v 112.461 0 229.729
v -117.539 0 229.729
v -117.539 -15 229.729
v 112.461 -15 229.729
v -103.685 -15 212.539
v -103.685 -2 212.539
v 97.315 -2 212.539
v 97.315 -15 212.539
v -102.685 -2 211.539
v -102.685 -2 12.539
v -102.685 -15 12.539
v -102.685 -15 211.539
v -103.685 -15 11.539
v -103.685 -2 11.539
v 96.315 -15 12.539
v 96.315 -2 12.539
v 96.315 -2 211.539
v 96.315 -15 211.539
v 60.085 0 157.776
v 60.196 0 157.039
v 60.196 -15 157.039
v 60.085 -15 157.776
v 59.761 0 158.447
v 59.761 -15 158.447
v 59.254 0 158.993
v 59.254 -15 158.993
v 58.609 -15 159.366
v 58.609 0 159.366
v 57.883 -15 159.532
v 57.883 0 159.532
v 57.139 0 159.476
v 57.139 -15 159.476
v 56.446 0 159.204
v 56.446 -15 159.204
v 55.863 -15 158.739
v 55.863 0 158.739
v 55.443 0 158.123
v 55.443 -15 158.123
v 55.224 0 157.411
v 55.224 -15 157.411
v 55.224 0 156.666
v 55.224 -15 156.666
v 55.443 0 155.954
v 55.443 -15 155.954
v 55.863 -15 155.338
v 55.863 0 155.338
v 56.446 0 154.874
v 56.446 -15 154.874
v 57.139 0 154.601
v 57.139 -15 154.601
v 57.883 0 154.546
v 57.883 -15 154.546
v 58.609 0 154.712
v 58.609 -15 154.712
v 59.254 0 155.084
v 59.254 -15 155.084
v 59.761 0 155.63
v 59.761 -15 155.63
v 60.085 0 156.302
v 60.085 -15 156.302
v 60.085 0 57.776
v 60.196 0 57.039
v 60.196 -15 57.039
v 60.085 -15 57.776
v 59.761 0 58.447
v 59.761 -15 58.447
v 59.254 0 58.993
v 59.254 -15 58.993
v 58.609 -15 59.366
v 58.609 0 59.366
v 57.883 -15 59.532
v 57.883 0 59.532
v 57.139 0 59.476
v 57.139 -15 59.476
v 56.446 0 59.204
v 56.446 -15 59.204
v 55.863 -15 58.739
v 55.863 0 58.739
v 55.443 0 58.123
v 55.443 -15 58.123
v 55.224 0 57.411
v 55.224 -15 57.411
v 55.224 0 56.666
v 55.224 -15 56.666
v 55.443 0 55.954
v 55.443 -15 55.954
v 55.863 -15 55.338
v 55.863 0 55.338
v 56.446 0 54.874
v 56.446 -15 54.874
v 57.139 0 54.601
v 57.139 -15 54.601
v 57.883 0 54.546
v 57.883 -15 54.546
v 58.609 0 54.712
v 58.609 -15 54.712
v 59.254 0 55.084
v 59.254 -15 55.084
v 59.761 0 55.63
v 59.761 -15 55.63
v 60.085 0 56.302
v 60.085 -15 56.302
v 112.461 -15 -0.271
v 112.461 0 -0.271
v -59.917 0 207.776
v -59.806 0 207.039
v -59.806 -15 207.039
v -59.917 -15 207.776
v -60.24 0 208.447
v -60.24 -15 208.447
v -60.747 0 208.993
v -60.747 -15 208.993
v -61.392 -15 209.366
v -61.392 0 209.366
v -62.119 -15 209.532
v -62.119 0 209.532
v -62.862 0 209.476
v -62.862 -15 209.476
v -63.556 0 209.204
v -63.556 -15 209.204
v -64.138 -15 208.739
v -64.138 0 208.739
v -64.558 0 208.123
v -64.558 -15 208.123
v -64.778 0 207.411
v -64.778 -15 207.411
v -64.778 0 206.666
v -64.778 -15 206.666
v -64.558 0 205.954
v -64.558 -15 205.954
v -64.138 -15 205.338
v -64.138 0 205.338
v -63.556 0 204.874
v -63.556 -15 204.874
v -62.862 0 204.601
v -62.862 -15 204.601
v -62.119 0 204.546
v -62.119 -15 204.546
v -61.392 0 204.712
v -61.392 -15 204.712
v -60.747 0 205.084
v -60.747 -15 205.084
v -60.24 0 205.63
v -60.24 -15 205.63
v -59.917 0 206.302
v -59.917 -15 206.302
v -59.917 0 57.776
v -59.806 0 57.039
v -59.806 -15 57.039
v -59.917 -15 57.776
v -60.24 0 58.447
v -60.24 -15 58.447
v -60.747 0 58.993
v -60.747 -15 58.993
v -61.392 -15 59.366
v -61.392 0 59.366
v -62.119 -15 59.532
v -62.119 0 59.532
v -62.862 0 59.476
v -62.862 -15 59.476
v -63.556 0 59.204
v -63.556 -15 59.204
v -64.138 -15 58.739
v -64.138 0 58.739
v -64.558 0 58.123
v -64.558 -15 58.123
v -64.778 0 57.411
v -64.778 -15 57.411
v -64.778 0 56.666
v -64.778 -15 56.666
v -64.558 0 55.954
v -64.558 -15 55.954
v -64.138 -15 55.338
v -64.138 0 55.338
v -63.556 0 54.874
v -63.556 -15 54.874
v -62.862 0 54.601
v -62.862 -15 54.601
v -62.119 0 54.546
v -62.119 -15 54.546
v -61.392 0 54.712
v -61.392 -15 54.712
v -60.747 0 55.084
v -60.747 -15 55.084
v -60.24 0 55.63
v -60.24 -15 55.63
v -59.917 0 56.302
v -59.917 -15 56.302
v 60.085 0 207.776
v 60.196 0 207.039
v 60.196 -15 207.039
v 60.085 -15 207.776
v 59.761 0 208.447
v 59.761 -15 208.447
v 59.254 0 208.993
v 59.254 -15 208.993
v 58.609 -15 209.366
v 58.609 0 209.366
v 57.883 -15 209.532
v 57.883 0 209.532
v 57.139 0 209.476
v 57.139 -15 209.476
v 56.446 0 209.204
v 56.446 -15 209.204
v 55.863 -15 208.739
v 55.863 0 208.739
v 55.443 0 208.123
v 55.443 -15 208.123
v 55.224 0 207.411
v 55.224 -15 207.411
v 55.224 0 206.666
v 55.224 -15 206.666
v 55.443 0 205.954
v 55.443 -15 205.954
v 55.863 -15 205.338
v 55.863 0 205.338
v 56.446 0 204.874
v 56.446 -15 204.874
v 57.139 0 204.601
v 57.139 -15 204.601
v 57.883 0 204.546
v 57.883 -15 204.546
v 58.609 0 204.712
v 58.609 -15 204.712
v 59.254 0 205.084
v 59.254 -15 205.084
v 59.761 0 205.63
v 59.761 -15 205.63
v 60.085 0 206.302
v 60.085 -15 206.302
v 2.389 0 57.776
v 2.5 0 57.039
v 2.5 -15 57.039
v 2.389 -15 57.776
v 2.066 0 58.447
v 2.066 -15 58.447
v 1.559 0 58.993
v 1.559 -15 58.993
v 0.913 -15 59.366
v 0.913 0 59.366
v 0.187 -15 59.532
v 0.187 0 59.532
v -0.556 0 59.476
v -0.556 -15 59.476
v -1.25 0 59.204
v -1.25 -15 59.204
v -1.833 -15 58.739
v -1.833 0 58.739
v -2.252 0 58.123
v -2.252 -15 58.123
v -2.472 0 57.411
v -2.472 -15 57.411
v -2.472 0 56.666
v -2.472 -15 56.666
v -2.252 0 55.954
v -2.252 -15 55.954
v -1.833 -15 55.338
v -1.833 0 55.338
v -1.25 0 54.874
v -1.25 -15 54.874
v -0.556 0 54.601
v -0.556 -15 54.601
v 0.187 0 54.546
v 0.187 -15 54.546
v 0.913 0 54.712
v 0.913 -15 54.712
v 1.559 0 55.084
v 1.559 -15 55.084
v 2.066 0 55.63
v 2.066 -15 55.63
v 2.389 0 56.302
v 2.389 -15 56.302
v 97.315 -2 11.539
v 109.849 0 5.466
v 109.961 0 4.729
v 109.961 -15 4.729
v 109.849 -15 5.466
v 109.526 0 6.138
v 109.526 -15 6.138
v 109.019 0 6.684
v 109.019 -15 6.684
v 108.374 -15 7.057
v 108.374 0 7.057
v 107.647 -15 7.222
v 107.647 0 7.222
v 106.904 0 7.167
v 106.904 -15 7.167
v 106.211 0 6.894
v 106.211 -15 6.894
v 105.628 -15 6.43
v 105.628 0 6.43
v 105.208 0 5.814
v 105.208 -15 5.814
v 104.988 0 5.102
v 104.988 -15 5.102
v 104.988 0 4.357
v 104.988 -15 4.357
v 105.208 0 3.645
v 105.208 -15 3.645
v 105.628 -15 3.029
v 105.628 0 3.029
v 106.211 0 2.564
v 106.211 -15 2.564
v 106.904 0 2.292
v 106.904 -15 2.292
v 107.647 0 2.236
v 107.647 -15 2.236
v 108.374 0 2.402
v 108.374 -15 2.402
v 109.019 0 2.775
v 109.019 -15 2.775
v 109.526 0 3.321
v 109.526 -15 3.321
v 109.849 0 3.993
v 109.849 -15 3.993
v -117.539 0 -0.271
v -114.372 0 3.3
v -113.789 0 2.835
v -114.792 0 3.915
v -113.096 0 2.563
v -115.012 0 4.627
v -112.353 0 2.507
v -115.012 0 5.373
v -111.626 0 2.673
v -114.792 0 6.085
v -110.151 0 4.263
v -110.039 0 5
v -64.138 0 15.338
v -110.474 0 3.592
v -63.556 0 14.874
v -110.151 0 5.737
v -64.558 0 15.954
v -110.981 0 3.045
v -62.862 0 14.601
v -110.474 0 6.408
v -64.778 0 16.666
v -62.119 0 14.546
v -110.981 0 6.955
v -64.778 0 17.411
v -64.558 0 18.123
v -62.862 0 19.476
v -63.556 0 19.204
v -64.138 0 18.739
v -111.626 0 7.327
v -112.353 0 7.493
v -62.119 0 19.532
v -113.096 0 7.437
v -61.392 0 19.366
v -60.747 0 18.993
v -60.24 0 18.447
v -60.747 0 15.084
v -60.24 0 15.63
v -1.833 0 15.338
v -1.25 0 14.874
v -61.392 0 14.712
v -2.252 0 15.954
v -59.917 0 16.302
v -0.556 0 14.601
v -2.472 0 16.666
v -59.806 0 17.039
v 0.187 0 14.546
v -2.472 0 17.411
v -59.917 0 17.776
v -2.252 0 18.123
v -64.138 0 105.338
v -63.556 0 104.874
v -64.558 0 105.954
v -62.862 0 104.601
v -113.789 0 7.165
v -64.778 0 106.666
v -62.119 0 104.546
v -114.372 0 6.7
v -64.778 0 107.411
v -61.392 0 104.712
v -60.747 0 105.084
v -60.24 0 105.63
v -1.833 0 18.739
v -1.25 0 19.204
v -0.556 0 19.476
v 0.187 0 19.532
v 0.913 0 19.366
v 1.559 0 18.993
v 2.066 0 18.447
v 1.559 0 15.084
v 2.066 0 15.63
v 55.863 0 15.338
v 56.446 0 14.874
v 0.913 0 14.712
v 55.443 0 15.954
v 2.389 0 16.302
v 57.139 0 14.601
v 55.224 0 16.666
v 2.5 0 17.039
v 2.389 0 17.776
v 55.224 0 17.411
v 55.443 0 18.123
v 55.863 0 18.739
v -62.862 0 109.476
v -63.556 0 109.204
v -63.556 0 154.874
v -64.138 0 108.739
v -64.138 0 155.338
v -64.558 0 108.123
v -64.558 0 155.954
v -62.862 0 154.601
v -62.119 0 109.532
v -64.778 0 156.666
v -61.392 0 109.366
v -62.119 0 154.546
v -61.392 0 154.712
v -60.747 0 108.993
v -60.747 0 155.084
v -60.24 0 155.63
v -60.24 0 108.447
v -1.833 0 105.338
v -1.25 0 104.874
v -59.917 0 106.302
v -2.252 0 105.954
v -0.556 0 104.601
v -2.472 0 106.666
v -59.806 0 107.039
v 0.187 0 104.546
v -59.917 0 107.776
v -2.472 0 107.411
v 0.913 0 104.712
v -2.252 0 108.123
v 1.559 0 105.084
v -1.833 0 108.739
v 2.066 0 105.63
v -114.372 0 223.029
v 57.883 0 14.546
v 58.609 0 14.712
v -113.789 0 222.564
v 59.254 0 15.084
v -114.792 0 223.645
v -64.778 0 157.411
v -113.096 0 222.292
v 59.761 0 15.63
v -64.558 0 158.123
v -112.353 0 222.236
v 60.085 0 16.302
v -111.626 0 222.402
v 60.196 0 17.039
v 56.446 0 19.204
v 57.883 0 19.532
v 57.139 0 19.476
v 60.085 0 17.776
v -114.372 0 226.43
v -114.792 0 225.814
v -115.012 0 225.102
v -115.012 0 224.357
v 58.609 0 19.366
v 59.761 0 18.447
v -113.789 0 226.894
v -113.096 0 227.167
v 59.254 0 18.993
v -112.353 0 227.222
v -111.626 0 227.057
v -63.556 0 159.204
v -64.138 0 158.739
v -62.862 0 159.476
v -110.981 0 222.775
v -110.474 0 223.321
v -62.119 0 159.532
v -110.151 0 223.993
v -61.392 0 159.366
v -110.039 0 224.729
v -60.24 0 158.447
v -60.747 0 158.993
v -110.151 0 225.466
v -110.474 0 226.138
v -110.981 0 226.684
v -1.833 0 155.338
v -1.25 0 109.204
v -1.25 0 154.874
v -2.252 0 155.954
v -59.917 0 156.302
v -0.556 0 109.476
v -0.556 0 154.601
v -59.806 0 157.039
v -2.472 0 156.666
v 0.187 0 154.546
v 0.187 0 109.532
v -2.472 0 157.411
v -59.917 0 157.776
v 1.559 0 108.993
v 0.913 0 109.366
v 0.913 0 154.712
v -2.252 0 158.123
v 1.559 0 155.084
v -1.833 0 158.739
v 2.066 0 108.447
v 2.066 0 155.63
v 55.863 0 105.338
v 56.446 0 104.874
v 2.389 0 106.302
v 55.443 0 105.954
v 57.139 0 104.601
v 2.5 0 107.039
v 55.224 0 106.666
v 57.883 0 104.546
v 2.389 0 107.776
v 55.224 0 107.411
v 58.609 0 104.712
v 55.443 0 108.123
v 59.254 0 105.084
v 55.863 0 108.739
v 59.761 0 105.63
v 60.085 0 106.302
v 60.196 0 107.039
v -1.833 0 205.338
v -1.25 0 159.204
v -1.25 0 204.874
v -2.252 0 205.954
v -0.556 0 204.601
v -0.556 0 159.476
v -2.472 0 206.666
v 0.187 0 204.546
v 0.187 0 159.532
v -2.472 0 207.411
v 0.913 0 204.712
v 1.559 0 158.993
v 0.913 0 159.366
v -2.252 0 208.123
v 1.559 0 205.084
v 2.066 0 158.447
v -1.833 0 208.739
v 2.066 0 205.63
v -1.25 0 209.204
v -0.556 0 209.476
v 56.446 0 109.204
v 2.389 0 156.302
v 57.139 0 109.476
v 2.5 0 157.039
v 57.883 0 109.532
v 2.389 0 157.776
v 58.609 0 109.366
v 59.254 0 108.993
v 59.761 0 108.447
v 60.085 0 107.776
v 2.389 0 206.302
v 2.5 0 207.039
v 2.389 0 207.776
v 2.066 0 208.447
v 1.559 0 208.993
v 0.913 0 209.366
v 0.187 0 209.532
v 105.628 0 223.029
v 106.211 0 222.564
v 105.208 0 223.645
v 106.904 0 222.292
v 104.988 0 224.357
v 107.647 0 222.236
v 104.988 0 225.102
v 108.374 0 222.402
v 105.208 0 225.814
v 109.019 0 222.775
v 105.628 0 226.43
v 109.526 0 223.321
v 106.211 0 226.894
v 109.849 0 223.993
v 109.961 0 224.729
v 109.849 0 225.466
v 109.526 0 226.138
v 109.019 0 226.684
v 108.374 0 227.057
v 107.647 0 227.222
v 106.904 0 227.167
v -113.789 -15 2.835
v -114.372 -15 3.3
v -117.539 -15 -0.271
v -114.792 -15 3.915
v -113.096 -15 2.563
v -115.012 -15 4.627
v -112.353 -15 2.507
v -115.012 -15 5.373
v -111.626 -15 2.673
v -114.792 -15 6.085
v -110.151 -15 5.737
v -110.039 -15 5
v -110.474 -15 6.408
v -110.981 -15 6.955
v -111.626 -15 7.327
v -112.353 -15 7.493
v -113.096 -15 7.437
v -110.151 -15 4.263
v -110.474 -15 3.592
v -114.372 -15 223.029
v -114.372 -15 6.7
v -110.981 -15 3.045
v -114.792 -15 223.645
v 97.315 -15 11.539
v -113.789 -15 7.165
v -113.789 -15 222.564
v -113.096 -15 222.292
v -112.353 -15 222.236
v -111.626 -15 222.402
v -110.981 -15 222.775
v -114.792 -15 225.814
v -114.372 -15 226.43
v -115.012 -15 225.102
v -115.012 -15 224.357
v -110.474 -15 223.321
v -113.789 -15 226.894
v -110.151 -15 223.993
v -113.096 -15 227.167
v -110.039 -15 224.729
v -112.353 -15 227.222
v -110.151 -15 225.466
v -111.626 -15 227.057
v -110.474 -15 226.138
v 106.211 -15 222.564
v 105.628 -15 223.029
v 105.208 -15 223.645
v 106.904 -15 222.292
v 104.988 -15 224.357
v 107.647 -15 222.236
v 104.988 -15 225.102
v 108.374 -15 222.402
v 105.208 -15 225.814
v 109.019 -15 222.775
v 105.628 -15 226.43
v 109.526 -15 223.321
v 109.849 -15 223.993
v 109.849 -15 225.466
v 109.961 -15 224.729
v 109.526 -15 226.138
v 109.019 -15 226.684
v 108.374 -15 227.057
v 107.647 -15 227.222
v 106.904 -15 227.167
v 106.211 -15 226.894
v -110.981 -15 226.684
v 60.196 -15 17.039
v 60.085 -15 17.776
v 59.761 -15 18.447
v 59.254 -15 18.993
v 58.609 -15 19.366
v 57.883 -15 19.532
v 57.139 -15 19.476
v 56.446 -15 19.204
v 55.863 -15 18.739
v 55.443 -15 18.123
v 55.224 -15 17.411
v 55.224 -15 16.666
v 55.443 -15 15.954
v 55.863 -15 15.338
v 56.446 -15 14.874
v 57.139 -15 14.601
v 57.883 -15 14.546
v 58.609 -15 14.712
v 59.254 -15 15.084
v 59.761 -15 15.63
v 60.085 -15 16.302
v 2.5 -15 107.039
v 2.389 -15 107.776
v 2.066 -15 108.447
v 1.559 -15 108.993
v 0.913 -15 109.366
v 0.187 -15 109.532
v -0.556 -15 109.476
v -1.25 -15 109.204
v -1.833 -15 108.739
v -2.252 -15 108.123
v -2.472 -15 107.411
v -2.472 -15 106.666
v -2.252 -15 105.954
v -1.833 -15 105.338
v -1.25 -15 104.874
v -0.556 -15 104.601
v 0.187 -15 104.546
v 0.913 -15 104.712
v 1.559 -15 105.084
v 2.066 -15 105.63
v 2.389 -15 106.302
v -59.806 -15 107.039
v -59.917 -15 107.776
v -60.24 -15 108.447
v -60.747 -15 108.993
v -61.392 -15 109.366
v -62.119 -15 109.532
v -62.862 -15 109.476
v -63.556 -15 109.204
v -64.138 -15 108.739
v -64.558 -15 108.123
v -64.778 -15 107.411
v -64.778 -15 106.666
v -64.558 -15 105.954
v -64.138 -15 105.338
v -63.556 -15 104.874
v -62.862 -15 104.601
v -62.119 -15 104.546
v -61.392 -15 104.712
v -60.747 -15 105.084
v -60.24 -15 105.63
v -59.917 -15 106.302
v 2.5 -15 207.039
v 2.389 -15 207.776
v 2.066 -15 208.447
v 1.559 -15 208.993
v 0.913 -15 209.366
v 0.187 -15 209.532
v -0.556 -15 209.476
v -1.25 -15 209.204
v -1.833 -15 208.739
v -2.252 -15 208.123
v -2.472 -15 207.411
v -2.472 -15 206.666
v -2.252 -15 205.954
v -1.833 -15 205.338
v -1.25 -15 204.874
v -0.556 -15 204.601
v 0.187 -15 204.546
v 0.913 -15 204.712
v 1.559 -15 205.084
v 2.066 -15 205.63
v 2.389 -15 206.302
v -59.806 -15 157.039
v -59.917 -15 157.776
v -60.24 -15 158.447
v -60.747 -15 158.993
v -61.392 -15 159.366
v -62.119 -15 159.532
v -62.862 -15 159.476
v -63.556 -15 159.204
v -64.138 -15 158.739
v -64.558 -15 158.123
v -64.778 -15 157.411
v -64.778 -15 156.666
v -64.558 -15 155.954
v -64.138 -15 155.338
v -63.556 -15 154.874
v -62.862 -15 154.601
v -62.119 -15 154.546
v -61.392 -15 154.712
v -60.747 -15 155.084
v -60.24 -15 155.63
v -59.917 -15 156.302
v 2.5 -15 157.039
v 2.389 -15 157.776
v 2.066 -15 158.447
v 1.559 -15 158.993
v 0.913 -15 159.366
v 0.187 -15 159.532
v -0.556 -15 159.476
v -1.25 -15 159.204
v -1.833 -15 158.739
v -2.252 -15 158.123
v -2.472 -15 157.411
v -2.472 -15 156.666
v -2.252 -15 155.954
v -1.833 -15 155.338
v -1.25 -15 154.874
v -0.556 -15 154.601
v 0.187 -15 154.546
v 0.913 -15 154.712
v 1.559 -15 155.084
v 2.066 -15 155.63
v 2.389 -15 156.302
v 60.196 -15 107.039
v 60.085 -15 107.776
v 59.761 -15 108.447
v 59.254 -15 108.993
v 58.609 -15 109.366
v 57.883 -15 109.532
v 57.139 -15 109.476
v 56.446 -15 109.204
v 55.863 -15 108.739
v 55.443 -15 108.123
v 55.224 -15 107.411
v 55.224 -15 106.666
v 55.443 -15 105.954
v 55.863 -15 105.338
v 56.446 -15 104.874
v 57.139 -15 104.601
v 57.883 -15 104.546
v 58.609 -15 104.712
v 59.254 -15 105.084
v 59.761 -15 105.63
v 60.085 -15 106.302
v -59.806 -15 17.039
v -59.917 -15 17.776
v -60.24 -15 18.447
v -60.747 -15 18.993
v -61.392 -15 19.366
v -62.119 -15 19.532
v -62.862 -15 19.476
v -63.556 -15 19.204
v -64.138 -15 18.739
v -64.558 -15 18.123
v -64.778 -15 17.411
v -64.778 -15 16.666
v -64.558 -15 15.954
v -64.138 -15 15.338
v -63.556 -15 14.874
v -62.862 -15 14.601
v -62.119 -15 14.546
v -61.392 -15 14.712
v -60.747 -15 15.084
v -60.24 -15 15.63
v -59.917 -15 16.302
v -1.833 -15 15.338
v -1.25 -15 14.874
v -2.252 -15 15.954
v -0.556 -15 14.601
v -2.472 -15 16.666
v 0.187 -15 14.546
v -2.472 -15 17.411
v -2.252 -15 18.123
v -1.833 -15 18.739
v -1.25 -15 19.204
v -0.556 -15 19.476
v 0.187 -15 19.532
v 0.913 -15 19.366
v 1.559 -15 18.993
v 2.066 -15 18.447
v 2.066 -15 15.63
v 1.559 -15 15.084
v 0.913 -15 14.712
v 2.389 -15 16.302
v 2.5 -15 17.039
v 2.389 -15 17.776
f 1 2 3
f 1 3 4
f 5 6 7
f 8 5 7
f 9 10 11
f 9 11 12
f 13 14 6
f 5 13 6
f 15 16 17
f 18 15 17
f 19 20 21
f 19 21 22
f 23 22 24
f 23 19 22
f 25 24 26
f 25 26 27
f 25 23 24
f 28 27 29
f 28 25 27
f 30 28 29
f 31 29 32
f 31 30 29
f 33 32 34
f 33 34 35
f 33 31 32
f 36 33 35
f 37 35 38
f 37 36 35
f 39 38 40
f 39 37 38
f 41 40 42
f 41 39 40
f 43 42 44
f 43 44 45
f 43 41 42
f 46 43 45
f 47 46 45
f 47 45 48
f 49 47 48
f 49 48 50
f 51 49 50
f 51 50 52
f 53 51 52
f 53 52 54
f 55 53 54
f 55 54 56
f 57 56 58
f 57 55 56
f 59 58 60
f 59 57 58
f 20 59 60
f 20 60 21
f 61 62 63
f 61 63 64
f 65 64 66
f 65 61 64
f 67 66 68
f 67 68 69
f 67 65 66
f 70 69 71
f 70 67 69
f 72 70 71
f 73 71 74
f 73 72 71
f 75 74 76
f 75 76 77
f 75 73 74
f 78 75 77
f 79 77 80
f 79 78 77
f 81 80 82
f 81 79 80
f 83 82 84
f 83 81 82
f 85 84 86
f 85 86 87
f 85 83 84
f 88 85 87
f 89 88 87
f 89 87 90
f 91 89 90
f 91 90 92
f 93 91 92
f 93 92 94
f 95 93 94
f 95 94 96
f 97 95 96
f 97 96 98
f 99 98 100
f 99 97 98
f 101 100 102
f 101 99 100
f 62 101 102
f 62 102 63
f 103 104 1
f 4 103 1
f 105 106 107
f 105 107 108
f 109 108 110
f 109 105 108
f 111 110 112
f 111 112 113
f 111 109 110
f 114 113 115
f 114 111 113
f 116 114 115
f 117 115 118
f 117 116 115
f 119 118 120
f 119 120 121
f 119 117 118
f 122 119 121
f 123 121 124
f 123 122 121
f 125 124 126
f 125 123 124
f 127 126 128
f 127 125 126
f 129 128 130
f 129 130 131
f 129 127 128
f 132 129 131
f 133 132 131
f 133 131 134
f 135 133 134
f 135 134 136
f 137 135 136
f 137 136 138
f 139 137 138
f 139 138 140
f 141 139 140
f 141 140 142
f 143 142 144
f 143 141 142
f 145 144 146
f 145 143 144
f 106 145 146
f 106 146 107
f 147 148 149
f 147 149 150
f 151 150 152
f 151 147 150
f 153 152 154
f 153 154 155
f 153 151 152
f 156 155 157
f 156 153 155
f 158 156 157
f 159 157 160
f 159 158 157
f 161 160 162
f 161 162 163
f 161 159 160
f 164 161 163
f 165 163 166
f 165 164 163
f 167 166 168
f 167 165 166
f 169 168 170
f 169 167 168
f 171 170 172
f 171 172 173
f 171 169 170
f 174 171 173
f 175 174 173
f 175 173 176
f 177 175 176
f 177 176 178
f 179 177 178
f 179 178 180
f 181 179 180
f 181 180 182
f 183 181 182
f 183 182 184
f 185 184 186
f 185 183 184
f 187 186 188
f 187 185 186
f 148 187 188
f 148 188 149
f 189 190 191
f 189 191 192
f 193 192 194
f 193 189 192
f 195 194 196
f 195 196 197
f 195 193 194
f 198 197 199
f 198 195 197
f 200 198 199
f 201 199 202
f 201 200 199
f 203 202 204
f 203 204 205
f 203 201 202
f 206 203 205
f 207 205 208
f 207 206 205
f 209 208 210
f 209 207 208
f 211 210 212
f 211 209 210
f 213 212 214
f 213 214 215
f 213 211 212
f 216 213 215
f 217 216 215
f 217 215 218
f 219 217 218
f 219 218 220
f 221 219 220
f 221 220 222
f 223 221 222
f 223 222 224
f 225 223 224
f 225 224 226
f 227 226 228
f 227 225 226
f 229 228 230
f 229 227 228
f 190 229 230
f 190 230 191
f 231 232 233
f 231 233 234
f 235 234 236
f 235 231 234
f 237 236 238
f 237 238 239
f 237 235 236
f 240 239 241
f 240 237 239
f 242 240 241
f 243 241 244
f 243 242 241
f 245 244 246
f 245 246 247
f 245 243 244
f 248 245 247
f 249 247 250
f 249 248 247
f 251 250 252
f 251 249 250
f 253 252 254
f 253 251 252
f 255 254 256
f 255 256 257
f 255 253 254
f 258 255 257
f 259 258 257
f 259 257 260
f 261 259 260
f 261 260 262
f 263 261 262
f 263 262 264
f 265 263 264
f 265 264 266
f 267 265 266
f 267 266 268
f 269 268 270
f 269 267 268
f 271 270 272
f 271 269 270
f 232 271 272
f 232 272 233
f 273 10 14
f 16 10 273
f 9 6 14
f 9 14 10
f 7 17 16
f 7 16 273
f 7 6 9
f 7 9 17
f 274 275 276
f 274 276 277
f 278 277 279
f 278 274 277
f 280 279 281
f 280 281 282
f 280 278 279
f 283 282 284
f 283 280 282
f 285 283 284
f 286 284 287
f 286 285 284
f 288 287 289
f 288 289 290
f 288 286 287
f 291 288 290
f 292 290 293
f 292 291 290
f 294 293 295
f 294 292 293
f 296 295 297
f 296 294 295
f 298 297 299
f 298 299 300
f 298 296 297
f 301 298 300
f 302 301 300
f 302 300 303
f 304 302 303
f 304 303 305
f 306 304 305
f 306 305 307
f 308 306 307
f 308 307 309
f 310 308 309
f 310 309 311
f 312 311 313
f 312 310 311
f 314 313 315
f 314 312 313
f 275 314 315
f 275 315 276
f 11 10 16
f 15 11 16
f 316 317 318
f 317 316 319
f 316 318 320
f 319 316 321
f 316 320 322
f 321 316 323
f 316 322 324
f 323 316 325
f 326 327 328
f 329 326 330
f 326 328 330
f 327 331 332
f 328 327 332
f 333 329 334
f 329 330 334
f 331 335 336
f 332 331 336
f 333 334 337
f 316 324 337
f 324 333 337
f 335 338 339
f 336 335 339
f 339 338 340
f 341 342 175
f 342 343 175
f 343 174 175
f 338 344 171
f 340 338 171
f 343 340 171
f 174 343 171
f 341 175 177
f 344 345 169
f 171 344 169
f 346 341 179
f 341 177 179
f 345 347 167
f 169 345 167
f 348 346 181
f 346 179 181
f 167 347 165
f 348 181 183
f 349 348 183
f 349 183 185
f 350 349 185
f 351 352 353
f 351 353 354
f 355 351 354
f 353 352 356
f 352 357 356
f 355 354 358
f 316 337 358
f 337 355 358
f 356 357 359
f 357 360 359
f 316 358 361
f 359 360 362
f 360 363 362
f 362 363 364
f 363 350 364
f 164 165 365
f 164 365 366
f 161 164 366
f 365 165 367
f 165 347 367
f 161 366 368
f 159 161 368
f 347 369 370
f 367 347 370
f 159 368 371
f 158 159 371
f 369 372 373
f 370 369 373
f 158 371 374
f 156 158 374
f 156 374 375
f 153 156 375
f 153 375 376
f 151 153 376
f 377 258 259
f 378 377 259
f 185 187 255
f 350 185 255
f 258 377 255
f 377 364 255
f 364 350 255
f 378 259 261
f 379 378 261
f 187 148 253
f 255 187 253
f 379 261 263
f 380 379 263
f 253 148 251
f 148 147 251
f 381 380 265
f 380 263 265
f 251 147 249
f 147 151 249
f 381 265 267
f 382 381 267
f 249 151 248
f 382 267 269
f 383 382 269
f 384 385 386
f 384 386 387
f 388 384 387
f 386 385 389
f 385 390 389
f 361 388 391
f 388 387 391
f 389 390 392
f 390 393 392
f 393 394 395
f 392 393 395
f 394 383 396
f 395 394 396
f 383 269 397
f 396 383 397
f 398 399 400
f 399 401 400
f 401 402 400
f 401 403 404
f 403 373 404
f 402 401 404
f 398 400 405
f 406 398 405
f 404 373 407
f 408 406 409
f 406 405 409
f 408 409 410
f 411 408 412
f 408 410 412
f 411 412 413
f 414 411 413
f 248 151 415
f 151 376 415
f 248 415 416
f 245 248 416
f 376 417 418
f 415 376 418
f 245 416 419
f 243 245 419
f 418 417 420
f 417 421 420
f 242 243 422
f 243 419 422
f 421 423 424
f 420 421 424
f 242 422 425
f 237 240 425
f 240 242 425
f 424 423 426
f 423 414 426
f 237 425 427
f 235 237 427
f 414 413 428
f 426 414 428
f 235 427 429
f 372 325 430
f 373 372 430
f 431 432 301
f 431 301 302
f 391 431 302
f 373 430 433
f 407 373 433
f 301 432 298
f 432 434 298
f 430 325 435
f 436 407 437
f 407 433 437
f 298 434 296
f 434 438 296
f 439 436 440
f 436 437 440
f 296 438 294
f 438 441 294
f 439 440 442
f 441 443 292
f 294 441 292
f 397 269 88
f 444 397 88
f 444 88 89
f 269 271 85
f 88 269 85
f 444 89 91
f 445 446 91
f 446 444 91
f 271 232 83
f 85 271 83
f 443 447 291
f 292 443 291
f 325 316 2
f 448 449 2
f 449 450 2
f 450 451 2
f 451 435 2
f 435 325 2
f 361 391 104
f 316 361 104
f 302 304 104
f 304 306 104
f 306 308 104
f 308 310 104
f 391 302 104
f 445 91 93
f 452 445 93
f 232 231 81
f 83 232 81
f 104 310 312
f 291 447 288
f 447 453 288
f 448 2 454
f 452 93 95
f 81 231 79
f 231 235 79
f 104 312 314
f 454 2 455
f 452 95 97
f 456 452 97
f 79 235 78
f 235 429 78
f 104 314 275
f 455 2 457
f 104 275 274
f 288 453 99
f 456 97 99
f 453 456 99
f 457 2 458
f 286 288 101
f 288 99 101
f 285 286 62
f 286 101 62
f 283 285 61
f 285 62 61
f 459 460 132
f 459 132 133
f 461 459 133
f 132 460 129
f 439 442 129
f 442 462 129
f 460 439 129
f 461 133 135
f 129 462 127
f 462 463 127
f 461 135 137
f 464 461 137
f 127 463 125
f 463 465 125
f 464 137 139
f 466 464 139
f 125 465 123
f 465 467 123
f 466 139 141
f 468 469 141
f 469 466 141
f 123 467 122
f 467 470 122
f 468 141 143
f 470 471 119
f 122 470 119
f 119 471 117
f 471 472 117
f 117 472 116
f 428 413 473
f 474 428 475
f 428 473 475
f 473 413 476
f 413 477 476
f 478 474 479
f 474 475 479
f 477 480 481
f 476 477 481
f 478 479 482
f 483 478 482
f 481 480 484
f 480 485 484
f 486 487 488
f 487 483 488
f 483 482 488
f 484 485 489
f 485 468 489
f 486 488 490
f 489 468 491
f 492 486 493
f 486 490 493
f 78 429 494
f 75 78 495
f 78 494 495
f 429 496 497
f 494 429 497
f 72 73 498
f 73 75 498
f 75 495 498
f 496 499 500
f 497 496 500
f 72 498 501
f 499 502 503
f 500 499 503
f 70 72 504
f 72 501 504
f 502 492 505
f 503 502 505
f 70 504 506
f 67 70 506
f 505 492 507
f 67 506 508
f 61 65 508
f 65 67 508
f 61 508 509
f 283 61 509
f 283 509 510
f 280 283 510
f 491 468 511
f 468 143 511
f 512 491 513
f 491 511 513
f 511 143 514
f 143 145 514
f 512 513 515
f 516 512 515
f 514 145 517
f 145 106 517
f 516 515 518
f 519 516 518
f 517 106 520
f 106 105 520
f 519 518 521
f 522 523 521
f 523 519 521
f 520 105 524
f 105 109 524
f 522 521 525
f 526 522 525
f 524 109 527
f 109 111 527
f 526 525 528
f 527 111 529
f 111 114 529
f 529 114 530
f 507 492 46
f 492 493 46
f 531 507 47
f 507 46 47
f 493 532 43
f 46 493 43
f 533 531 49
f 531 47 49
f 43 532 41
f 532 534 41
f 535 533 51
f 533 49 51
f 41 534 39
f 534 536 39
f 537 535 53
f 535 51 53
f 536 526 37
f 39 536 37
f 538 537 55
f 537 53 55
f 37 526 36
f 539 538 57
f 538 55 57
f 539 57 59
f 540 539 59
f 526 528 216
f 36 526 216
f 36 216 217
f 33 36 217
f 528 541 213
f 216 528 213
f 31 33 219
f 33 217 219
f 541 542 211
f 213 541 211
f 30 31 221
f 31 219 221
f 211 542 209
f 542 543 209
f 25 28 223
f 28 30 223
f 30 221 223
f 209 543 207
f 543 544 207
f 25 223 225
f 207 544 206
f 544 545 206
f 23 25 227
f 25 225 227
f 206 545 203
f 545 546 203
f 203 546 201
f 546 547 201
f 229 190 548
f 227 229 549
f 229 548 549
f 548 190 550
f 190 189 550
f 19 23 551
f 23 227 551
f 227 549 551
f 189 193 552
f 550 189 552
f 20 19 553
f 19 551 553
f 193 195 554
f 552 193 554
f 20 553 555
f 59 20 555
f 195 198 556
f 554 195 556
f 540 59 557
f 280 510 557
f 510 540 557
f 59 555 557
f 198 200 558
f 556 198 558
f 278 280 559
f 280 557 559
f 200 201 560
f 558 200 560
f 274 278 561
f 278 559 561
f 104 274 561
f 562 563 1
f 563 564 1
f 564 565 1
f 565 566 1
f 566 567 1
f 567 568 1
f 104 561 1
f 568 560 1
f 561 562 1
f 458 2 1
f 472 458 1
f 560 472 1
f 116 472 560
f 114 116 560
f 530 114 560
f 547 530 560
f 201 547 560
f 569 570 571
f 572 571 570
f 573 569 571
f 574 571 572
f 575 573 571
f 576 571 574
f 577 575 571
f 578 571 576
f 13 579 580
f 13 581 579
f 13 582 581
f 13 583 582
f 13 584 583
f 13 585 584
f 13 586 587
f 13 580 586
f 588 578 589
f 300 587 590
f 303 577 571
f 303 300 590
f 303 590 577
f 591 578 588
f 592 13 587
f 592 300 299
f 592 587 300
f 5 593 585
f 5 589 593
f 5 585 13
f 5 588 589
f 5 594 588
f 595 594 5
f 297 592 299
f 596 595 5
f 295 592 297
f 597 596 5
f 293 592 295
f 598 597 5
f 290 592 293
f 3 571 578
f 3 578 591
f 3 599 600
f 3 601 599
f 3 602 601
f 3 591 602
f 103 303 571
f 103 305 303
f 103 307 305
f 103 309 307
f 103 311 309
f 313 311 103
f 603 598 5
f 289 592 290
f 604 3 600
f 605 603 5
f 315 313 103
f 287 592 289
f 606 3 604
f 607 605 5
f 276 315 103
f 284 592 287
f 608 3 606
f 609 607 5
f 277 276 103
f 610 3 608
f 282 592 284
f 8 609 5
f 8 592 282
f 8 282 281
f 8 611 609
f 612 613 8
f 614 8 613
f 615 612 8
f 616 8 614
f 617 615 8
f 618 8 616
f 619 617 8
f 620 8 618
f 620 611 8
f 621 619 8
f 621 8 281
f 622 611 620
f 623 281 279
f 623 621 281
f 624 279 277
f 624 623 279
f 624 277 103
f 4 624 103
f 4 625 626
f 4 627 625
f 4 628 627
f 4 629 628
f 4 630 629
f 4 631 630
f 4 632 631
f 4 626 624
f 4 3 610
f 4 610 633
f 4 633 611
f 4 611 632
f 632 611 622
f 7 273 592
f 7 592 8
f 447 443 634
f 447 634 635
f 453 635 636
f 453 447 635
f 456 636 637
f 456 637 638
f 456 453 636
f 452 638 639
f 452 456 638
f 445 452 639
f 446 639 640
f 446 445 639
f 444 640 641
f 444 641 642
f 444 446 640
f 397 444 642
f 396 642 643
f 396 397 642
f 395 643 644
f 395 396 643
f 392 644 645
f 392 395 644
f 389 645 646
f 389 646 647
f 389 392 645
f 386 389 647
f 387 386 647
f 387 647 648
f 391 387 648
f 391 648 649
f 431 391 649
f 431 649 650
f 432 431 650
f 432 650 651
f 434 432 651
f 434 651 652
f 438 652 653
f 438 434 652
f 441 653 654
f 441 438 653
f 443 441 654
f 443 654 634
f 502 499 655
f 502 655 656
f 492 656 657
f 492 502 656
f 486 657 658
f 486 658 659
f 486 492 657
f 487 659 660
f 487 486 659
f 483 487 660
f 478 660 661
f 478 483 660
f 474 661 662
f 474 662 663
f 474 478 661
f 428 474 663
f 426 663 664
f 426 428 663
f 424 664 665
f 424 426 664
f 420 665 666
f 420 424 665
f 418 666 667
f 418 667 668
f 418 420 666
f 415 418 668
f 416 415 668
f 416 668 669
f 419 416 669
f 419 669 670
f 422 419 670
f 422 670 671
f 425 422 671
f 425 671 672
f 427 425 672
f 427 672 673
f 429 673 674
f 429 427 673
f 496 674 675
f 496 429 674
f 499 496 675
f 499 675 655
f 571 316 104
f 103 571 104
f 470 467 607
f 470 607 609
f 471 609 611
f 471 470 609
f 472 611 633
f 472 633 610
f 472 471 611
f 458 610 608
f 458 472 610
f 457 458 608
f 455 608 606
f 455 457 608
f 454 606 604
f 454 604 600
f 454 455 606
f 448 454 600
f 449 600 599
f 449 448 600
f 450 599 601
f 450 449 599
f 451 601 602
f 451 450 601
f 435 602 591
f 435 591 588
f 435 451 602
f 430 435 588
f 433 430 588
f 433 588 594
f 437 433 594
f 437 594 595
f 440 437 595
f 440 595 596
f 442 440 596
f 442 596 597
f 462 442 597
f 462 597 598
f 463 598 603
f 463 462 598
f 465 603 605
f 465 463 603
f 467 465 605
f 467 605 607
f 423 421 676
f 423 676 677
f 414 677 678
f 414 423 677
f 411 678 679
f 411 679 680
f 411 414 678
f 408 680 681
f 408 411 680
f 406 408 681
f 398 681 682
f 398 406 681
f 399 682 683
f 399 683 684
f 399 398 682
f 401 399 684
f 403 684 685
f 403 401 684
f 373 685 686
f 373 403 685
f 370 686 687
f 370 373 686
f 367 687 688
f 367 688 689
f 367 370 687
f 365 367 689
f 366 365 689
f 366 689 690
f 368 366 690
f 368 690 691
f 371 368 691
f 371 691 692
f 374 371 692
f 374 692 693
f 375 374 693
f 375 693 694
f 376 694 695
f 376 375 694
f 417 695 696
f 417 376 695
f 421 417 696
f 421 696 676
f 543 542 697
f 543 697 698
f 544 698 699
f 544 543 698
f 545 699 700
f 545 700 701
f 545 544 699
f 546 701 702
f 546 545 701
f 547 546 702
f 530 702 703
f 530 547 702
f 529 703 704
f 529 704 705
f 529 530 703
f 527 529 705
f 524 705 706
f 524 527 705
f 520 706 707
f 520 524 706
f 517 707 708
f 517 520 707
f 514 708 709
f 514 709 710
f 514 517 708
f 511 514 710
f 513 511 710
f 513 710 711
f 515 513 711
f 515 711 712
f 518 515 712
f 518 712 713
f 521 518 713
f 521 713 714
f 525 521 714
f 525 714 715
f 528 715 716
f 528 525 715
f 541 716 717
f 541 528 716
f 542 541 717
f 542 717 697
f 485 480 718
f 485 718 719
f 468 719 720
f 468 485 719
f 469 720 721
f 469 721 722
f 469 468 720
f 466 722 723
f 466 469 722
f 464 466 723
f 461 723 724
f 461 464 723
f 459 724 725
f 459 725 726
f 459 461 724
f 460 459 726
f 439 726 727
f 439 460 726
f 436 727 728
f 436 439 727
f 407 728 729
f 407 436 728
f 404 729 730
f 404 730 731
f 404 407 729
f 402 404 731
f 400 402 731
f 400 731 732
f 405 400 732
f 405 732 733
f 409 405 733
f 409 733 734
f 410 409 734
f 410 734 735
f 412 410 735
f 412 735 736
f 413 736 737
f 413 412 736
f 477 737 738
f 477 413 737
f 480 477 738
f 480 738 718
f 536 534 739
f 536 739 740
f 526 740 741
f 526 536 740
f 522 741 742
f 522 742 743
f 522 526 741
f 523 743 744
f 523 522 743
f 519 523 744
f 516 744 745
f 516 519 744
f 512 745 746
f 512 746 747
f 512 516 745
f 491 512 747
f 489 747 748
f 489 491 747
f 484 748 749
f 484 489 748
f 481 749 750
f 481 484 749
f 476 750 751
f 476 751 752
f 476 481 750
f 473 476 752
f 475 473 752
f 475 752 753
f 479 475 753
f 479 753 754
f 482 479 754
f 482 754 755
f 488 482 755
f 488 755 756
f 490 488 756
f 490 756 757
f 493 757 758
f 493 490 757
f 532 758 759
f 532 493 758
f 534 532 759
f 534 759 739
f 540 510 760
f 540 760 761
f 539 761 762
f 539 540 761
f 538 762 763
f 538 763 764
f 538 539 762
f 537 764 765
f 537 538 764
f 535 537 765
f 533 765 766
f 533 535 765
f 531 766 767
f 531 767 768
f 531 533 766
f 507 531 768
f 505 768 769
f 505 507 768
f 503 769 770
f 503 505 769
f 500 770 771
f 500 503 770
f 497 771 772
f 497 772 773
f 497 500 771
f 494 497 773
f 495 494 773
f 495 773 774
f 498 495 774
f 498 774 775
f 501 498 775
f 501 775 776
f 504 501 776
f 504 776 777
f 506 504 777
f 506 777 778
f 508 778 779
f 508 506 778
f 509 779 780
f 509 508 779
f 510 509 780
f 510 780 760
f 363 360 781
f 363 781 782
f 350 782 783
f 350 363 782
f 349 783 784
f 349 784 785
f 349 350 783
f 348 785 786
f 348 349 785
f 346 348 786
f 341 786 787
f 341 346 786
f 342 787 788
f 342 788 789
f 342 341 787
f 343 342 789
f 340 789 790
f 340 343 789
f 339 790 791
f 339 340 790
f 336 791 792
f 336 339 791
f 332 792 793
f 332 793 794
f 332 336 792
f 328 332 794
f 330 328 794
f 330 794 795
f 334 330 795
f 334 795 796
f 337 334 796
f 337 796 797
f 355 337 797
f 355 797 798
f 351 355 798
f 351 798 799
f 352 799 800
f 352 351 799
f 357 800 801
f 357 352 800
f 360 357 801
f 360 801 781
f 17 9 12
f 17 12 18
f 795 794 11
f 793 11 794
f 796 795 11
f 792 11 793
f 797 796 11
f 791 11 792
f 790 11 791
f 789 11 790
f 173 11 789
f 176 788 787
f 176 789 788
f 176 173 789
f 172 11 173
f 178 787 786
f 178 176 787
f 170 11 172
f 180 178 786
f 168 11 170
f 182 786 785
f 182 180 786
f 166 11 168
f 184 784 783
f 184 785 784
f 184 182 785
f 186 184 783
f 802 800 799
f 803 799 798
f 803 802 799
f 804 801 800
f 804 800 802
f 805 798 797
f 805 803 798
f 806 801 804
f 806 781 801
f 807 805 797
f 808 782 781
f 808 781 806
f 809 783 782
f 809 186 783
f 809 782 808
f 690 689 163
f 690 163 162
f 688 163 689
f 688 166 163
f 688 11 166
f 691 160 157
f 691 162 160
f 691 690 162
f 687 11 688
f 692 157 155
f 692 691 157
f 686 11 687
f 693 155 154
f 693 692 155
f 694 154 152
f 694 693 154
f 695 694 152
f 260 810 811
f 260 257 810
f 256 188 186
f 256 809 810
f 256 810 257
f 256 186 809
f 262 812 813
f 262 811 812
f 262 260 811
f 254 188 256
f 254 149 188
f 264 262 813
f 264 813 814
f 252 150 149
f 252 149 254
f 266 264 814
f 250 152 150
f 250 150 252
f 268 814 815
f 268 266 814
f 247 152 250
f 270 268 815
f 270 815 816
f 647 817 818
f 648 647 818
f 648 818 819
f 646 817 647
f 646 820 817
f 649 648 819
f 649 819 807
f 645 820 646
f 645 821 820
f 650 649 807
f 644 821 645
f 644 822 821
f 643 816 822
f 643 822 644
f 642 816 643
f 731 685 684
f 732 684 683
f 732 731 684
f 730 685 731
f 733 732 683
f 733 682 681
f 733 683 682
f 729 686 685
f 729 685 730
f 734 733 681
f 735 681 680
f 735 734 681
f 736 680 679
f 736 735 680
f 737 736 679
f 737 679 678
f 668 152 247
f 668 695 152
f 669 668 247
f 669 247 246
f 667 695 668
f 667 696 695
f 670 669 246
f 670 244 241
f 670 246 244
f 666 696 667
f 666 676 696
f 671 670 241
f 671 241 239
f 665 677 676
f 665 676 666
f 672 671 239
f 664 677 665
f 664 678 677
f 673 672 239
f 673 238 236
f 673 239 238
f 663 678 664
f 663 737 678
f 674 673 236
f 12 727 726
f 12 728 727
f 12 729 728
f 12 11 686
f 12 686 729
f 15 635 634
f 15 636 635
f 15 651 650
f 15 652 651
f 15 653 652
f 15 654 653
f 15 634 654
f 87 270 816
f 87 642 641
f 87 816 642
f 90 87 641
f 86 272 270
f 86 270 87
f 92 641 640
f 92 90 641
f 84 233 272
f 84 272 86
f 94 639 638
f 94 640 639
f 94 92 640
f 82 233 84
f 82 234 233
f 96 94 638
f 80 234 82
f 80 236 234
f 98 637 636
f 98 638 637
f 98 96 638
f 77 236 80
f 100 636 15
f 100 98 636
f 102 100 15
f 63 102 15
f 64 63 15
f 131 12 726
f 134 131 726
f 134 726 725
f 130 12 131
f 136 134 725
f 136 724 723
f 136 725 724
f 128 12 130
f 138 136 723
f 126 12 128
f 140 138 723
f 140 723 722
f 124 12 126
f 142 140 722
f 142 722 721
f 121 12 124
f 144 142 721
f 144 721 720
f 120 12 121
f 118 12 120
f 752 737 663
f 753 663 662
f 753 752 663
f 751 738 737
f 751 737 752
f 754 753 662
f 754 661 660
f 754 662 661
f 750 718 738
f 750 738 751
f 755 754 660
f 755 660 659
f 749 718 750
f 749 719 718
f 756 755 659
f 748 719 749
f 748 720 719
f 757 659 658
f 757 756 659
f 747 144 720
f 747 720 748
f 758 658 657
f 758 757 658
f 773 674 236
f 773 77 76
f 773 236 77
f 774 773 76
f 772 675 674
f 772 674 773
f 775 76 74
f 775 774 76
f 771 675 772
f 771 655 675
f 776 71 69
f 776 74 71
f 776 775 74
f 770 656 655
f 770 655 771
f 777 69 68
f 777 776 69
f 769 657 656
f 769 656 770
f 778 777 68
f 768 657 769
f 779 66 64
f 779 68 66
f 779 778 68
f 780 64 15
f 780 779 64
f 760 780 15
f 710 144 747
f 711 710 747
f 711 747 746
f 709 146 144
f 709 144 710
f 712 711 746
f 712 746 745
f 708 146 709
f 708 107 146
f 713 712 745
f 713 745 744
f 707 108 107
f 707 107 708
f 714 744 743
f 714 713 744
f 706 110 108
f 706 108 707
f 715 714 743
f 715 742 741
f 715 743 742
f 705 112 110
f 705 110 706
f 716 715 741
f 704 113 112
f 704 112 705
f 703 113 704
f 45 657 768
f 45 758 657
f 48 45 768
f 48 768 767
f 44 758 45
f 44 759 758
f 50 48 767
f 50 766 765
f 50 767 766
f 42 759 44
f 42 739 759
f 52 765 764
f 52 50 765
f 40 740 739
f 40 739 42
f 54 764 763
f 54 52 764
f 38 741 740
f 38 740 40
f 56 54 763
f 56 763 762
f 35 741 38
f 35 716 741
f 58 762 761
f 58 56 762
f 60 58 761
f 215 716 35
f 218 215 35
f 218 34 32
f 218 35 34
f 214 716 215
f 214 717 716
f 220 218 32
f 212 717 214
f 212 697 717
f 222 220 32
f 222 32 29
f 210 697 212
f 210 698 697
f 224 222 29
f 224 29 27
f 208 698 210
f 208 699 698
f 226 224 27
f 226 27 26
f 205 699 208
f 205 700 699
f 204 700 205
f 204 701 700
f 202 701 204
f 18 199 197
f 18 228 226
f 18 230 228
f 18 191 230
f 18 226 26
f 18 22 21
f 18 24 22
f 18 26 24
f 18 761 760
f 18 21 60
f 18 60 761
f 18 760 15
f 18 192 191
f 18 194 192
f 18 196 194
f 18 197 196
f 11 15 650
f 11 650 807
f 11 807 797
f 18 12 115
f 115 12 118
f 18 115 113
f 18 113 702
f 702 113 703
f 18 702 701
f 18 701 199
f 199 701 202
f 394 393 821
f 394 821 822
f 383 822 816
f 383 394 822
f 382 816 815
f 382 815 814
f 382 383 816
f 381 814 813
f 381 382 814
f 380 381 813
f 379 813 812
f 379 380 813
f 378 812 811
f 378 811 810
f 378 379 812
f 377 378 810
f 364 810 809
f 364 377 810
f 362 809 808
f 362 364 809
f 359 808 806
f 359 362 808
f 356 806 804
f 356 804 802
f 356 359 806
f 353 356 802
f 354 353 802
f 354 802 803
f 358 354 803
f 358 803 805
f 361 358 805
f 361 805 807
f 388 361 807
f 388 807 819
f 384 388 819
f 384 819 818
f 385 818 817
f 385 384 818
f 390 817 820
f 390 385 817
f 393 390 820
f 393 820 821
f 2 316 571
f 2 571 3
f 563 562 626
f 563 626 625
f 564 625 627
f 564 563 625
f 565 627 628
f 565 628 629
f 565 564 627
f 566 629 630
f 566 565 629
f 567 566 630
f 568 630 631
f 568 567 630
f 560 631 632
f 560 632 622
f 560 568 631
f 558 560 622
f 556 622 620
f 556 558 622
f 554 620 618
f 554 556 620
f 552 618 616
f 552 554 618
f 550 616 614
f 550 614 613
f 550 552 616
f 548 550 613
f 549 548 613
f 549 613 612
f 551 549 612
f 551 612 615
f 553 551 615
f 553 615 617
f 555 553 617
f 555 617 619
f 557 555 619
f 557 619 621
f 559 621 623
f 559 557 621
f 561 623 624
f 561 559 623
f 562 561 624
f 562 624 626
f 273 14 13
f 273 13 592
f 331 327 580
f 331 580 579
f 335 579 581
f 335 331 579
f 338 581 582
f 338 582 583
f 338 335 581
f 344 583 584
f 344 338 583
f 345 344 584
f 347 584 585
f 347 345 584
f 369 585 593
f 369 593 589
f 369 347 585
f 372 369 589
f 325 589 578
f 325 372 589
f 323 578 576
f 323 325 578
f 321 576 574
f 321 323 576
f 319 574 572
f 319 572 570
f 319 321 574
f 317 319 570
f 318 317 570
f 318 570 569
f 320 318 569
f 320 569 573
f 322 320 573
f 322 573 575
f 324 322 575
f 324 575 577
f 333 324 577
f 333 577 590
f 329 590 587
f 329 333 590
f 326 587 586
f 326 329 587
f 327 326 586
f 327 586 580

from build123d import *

# Parameters (mm, degrees)
F0_W     = 201
F0_H     = 201
F0_W_2   = 199
F0_H_2   = 199
F1_DEPTH = 2
F0_W_3   = 230
F0_H_3   = 230
F0_R     = 2.5
F2_DEPTH = 15


with BuildPart() as f1:
    # F0 (on Front) → F1 (new body)
    with BuildSketch(Plane.XZ):
        with Locations((-3.184716, 112.03872)):
            Rectangle(F0_W, F0_H)
        with Locations((-3.184716, 112.03872)):
            Rectangle(F0_W_2, F0_H_2, mode=Mode.SUBTRACT)
    extrude(amount=F1_DEPTH)

    # F0 (on Front) → F2 (join)
    with BuildSketch(Plane.XZ):
        with Locations((-2.539473, 114.729389)):
            Rectangle(F0_W_3, F0_H_3)
        with Locations((-112.539473, 5)):
            Circle(F0_R, mode=Mode.SUBTRACT)
        with Locations((-3.184716, 112.03872)):
            Rectangle(F0_W, F0_H, mode=Mode.SUBTRACT)
        with Locations((107.460527, 4.729389)):
            Circle(F0_R, mode=Mode.SUBTRACT)
        with Locations((-112.539473, 224.729389)):
            Circle(F0_R, mode=Mode.SUBTRACT)
        with Locations((107.460527, 224.729389)):
            Circle(F0_R, mode=Mode.SUBTRACT)
        with Locations((-3.184716, 112.03872)):
            Rectangle(F0_W_2, F0_H_2)
        with Locations((-62.305588, 17.03872)):
            Circle(F0_R, mode=Mode.SUBTRACT)
        with Locations((-62.305588, 57.03872)):
            Circle(F0_R, mode=Mode.SUBTRACT)
        with Locations((-62.305588, 107.03872)):
            Circle(F0_R, mode=Mode.SUBTRACT)
        with Locations((0, 17.03872)):
            Circle(F0_R, mode=Mode.SUBTRACT)
        with Locations((0, 57.03872)):
            Circle(F0_R, mode=Mode.SUBTRACT)
        with Locations((57.69576, 17.03872)):
            Circle(F0_R, mode=Mode.SUBTRACT)
        with Locations((57.69576, 57.03872)):
            Circle(F0_R, mode=Mode.SUBTRACT)
        with Locations((0, 107.03872)):
            Circle(F0_R, mode=Mode.SUBTRACT)
        with Locations((57.69576, 107.03872)):
            Circle(F0_R, mode=Mode.SUBTRACT)
        with Locations((-62.305588, 157.03872)):
            Circle(F0_R, mode=Mode.SUBTRACT)
        with Locations((-62.305588, 207.03872)):
            Circle(F0_R, mode=Mode.SUBTRACT)
        with Locations((0, 157.03872)):
            Circle(F0_R, mode=Mode.SUBTRACT)
        with Locations((57.69576, 157.03872)):
            Circle(F0_R, mode=Mode.SUBTRACT)
        with Locations((0, 207.03872)):
            Circle(F0_R, mode=Mode.SUBTRACT)
        with Locations((57.69576, 207.03872)):
            Circle(F0_R, mode=Mode.SUBTRACT)
    extrude(amount=F2_DEPTH)


solid = f1.part
